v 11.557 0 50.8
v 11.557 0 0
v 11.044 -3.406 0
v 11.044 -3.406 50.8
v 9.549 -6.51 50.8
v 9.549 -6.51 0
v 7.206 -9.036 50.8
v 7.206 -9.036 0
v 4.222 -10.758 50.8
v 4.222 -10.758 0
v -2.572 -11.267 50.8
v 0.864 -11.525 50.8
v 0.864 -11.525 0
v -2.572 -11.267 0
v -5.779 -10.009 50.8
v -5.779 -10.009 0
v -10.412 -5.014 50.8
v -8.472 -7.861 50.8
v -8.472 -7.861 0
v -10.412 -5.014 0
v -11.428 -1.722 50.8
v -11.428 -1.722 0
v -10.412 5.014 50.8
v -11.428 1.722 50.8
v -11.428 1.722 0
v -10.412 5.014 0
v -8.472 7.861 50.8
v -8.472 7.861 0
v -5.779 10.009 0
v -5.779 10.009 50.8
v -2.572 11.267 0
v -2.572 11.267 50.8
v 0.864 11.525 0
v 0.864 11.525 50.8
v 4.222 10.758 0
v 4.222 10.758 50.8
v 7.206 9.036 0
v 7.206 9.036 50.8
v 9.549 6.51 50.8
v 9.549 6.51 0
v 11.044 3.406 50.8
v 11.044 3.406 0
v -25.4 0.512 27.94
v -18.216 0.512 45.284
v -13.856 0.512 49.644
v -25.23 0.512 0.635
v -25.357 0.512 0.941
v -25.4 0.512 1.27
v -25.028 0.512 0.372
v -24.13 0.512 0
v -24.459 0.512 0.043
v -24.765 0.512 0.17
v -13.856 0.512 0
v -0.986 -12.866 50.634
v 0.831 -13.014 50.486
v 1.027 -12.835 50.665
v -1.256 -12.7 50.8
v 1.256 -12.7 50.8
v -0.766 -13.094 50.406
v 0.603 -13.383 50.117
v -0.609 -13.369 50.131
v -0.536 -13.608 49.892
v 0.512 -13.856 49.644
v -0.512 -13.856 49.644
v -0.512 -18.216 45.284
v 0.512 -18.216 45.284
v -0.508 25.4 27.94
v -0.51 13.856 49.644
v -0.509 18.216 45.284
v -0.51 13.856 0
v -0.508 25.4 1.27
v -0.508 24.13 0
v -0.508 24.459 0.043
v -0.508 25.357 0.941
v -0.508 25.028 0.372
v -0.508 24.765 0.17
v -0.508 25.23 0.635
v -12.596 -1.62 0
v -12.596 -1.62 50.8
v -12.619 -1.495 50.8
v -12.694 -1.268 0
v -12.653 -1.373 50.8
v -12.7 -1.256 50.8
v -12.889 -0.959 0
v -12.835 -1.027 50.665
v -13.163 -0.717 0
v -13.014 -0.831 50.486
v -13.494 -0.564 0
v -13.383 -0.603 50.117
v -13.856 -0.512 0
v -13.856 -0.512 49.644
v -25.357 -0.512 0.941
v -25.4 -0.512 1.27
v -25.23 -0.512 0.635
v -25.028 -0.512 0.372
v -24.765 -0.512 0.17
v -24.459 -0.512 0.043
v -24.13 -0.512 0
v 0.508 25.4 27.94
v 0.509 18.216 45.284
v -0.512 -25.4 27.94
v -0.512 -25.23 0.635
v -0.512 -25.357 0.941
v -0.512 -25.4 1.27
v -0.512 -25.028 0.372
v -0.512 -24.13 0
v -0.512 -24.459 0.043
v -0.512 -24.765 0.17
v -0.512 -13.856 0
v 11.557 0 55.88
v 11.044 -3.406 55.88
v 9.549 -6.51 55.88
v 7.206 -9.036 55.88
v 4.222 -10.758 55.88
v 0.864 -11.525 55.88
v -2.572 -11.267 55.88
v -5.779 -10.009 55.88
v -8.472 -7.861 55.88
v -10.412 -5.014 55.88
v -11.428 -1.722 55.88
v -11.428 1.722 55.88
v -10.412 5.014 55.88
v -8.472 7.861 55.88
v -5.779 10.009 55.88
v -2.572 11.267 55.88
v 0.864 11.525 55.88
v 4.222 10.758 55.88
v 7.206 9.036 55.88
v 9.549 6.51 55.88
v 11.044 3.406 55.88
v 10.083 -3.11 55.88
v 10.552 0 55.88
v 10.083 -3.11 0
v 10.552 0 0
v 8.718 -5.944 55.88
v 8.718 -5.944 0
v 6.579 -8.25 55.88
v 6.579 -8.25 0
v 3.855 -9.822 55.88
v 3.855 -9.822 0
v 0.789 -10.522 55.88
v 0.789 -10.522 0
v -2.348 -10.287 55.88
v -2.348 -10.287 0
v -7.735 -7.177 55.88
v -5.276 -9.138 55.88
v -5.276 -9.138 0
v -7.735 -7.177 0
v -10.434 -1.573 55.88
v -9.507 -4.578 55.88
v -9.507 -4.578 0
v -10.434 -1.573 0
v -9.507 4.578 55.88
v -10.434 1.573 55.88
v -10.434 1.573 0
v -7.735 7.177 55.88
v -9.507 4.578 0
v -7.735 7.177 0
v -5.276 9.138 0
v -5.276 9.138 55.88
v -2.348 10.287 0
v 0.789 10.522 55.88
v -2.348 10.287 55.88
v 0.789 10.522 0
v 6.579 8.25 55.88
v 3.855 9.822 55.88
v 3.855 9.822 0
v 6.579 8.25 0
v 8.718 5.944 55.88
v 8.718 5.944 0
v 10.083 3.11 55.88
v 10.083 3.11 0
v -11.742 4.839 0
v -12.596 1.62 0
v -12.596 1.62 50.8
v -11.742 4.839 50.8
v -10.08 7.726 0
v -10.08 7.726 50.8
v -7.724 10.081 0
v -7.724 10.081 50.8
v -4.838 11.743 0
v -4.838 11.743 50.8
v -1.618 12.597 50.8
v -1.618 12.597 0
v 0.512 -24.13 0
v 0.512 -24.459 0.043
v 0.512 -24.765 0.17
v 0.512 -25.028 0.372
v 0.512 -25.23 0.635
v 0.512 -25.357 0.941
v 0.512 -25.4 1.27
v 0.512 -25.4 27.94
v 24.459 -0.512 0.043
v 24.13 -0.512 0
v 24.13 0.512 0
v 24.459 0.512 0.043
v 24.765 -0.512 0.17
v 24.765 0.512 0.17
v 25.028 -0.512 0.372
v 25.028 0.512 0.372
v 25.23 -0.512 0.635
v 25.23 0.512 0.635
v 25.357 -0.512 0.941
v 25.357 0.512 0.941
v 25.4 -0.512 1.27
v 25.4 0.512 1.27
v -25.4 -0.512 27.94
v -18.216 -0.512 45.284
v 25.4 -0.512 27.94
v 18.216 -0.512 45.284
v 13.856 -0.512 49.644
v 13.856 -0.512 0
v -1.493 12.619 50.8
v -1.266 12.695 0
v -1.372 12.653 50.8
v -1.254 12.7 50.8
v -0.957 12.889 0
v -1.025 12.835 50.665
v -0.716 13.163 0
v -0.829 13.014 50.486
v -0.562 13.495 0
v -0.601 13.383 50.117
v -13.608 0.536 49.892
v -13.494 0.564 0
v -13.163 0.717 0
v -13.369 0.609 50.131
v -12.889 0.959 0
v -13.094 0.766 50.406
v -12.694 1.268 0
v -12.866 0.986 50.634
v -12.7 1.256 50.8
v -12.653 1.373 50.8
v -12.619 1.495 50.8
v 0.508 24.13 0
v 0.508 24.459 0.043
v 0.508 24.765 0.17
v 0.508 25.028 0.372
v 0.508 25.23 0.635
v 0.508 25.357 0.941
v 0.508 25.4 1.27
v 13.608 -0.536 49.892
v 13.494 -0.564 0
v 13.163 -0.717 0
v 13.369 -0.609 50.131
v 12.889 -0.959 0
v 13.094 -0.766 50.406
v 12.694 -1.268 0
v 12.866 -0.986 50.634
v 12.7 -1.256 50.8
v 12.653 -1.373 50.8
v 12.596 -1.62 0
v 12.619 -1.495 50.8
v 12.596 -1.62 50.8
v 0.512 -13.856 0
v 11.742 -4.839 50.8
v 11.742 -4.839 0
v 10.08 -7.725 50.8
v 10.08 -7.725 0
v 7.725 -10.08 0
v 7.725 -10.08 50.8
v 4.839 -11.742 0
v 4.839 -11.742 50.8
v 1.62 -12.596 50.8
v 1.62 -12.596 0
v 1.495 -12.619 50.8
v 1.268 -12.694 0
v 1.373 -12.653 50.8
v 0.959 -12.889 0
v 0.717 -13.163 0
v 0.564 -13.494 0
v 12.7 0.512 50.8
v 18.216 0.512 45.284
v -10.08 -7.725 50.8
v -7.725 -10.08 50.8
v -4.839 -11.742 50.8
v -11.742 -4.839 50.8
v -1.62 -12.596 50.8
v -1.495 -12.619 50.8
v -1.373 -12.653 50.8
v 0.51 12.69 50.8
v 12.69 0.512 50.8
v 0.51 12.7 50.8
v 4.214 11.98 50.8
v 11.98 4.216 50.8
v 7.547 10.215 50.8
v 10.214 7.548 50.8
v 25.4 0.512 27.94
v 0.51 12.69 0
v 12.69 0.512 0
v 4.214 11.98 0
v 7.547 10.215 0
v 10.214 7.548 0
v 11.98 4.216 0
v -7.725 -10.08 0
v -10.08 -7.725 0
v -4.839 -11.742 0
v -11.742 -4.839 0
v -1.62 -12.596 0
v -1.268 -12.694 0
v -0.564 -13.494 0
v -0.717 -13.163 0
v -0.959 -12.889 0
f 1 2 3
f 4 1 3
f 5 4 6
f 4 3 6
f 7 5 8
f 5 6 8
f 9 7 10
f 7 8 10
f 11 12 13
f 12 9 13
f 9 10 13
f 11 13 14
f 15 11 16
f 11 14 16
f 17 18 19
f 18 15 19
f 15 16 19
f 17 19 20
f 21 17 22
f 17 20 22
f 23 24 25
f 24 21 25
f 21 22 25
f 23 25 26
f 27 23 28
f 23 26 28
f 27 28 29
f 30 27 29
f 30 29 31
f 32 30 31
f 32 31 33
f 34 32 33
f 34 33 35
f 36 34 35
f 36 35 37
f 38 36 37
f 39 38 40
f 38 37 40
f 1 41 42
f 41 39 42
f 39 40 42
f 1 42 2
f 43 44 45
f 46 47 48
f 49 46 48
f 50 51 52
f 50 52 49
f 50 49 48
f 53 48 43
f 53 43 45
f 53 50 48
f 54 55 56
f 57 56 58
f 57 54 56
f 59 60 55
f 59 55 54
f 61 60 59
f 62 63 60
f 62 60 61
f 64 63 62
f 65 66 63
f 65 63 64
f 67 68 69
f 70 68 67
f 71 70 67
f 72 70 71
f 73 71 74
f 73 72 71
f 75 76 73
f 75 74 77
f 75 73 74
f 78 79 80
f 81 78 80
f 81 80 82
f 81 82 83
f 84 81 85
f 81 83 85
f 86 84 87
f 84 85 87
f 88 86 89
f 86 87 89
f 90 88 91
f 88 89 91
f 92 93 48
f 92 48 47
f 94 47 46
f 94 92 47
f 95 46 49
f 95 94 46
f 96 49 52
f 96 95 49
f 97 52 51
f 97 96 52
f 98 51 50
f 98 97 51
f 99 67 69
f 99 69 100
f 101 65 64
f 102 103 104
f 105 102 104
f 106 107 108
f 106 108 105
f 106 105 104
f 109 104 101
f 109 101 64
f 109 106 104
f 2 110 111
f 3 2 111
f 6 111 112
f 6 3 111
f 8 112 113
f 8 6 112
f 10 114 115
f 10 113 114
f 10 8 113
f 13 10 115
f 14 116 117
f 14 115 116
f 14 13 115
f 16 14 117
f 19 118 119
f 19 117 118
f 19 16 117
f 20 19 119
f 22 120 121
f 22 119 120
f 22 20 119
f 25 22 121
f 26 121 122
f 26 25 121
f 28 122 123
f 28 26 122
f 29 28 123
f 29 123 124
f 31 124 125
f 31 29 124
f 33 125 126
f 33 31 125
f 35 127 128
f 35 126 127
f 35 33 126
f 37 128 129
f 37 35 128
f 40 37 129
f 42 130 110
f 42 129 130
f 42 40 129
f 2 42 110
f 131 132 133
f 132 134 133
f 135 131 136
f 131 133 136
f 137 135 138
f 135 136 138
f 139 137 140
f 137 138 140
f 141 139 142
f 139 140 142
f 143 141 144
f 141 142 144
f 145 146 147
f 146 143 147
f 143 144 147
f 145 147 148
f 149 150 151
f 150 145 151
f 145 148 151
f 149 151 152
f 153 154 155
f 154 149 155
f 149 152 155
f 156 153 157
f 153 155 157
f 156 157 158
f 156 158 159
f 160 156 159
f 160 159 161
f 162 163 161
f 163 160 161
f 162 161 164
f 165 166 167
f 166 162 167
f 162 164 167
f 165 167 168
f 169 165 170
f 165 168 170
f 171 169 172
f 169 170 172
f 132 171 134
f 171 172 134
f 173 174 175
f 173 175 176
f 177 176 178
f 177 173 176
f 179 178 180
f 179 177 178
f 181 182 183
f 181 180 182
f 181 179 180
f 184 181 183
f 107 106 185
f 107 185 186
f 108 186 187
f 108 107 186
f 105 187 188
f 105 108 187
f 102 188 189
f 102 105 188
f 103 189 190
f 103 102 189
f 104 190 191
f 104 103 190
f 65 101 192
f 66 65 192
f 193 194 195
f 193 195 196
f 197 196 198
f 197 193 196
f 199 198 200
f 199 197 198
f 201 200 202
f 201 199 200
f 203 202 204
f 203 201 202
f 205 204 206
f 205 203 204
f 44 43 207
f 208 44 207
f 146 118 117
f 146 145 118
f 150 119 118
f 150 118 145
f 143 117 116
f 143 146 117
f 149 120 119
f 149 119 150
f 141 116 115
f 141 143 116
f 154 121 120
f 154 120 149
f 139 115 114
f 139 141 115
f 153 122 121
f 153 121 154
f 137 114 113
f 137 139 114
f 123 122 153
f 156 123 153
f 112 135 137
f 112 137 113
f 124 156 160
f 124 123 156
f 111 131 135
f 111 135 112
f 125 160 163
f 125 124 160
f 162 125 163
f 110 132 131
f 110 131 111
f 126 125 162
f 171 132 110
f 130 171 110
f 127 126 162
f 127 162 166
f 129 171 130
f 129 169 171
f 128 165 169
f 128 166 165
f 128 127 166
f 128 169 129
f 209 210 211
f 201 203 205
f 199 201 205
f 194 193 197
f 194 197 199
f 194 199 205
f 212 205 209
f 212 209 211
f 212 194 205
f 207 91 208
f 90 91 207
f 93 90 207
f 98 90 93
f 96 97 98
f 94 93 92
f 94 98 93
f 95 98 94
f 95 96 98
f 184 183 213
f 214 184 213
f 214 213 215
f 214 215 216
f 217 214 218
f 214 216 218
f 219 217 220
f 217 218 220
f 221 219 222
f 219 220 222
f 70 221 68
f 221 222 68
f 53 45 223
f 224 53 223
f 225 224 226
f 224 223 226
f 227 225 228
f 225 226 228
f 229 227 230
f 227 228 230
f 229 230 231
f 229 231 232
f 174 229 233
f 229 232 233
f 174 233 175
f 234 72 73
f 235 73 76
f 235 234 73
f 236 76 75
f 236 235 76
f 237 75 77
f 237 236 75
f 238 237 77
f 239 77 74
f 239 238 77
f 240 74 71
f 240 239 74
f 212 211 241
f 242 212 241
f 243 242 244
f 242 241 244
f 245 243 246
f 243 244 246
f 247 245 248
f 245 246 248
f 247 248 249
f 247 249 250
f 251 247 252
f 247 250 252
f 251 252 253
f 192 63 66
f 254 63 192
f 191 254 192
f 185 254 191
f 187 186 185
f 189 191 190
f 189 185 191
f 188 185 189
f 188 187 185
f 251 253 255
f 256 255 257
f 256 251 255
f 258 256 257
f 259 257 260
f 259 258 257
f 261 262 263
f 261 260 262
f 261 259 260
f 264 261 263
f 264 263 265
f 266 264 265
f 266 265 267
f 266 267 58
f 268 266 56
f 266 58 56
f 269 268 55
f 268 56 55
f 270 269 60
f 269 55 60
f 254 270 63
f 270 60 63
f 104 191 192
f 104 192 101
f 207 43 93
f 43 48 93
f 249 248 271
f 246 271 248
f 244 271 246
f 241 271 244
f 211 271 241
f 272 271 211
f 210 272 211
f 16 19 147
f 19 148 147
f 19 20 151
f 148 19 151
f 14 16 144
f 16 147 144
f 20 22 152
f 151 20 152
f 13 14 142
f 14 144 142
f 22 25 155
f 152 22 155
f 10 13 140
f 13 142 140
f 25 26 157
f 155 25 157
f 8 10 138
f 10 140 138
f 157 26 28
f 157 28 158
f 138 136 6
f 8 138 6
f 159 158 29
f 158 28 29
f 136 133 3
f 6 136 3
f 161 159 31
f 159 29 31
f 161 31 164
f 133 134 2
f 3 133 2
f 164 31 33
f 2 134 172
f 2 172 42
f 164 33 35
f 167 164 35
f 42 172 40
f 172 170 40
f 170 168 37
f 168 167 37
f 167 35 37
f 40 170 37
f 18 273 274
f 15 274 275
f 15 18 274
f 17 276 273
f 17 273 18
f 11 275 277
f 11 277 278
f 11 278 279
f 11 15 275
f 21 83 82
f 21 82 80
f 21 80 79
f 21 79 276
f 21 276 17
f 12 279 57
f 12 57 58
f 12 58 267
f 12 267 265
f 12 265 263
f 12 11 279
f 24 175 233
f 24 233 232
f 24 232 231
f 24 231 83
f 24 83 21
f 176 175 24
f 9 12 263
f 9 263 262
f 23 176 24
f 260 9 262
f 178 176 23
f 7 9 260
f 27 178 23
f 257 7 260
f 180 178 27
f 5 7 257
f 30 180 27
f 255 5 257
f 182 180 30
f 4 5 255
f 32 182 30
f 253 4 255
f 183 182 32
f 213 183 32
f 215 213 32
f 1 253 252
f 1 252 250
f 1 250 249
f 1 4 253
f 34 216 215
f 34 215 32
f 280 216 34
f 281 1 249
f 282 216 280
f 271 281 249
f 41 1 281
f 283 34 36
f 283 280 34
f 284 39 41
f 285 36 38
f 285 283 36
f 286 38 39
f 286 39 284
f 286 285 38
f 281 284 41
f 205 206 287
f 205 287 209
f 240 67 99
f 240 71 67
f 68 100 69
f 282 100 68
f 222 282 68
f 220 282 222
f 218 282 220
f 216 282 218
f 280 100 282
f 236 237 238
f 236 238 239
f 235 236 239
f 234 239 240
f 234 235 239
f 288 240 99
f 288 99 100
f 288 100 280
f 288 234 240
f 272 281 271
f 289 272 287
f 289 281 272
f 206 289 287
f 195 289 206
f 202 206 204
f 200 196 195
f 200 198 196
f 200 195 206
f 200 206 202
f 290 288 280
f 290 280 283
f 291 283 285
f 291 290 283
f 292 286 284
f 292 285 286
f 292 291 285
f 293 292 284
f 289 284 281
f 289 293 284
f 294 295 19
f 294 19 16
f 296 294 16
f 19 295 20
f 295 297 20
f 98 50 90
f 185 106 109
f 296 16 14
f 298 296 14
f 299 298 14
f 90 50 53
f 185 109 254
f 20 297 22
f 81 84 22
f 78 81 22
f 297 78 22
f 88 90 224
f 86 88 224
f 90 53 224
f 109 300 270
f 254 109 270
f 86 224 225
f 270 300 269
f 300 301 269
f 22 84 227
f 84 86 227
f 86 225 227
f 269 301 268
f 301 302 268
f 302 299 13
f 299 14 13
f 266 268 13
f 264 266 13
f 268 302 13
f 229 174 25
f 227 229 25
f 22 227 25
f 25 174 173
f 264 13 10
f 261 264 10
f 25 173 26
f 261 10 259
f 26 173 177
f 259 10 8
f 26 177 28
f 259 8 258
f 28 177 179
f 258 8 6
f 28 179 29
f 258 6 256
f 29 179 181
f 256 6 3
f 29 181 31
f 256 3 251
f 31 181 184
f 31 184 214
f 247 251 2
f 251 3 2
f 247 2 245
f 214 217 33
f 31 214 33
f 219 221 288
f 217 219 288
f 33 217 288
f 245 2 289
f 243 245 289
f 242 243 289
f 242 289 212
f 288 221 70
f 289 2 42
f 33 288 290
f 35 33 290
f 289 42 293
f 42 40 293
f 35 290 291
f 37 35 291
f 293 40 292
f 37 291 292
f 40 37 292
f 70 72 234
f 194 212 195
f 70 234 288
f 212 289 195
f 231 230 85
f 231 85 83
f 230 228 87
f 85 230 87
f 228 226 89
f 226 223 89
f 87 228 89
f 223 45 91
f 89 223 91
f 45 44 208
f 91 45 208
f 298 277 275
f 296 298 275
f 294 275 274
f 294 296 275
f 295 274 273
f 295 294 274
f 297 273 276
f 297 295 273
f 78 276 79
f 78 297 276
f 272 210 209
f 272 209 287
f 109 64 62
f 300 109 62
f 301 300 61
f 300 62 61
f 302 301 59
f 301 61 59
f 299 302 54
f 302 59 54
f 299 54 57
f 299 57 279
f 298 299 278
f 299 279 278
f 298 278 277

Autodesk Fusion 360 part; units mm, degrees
sketch "Sketch1" plane through (0, 0, 0) normal (0, 0, 1) x (1, 0, 0)
  line L0 (0.508, 25.4) -> (0.5099, 12.6898)
  line L1 (-0.5117, -25.4) -> (-0.5117, -12.6897)
  circle A0 centre (0, 0) radius 12.7
  line L2 (-12.6897, -0.5117) -> (-25.4, -0.5117)
  line L3 (12.6897, 0.5117) -> (25.4, 0.5117)
  line L4 (-0.5099, 12.6898) -> (-0.508, 25.4)
  line L5 (-25.4, 0.5117) -> (-25.4, -0.5117)
  circle A1 centre (0, 0) radius 11.557
  line L6 (0.5117, -25.4) -> (-0.5117, -25.4)
  line L7 (-25.4, 0.5117) -> (-12.6897, 0.5117)
  line L8 (0.5117, -12.6897) -> (0.5117, -25.4)
  line L9 (-0.508, 25.4) -> (0.508, 25.4)
  line L10 (25.4, 0.5117) -> (25.4, -0.5117)
  line L11 (1.016, 25.521) -> (0, 25.521)
  line L12 (25.4, -0.5117) -> (12.6897, -0.5117)
  circle A2 centre (0, 0) radius 10.5519
  dimension "d2" = -1.143
  dimension "d1" = 25.4
  dimension "d8" = 1.016
extrude "Extrude2" add sketch "Sketch1" along normal blind 55.88 contours A1 makes body 1
extrude "Extrude1" add sketch "Sketch1" along normal blind 50.8 separate body contours L0 A0 L4 L9 | A0 | A0 L3 L10 L12 | A0 L2 L5 L7 | L1 A0 L6 L8 makes body 2
chamfer "Chamfer1" distance 12.7 angle 45 4 edges at (25.4, 0, 50.8) (0, -25.4, 50.8) (0, 25.4, 50.8) (-25.4, 0, 50.8) on bodies 2
chamfer "Chamfer2" distance 10.16 angle 45 4 edges at (25.4, 0, 38.1) (0, -25.4, 38.1) (-25.4, 0, 38.1) (0, 25.4, 38.1) on bodies 2
fillet "Fillet1" radius 1.27 6 edges at (-0.5099, 12.6898, 25.4) (-12.6897, 0.5117, 25.4) (-12.6897, -0.5117, 25.4) (-0.5117, -12.6897, 25.4) (0.5117, -12.6897, 25.4) (12.6897, -0.5117, 25.4) on bodies 2
fillet "Fillet2" radius 1.27 4 edges at (25.4, 0, 0) (0, 25.4, 0) (-25.4, 0, 0) (0, -25.4, 0) on bodies 2
